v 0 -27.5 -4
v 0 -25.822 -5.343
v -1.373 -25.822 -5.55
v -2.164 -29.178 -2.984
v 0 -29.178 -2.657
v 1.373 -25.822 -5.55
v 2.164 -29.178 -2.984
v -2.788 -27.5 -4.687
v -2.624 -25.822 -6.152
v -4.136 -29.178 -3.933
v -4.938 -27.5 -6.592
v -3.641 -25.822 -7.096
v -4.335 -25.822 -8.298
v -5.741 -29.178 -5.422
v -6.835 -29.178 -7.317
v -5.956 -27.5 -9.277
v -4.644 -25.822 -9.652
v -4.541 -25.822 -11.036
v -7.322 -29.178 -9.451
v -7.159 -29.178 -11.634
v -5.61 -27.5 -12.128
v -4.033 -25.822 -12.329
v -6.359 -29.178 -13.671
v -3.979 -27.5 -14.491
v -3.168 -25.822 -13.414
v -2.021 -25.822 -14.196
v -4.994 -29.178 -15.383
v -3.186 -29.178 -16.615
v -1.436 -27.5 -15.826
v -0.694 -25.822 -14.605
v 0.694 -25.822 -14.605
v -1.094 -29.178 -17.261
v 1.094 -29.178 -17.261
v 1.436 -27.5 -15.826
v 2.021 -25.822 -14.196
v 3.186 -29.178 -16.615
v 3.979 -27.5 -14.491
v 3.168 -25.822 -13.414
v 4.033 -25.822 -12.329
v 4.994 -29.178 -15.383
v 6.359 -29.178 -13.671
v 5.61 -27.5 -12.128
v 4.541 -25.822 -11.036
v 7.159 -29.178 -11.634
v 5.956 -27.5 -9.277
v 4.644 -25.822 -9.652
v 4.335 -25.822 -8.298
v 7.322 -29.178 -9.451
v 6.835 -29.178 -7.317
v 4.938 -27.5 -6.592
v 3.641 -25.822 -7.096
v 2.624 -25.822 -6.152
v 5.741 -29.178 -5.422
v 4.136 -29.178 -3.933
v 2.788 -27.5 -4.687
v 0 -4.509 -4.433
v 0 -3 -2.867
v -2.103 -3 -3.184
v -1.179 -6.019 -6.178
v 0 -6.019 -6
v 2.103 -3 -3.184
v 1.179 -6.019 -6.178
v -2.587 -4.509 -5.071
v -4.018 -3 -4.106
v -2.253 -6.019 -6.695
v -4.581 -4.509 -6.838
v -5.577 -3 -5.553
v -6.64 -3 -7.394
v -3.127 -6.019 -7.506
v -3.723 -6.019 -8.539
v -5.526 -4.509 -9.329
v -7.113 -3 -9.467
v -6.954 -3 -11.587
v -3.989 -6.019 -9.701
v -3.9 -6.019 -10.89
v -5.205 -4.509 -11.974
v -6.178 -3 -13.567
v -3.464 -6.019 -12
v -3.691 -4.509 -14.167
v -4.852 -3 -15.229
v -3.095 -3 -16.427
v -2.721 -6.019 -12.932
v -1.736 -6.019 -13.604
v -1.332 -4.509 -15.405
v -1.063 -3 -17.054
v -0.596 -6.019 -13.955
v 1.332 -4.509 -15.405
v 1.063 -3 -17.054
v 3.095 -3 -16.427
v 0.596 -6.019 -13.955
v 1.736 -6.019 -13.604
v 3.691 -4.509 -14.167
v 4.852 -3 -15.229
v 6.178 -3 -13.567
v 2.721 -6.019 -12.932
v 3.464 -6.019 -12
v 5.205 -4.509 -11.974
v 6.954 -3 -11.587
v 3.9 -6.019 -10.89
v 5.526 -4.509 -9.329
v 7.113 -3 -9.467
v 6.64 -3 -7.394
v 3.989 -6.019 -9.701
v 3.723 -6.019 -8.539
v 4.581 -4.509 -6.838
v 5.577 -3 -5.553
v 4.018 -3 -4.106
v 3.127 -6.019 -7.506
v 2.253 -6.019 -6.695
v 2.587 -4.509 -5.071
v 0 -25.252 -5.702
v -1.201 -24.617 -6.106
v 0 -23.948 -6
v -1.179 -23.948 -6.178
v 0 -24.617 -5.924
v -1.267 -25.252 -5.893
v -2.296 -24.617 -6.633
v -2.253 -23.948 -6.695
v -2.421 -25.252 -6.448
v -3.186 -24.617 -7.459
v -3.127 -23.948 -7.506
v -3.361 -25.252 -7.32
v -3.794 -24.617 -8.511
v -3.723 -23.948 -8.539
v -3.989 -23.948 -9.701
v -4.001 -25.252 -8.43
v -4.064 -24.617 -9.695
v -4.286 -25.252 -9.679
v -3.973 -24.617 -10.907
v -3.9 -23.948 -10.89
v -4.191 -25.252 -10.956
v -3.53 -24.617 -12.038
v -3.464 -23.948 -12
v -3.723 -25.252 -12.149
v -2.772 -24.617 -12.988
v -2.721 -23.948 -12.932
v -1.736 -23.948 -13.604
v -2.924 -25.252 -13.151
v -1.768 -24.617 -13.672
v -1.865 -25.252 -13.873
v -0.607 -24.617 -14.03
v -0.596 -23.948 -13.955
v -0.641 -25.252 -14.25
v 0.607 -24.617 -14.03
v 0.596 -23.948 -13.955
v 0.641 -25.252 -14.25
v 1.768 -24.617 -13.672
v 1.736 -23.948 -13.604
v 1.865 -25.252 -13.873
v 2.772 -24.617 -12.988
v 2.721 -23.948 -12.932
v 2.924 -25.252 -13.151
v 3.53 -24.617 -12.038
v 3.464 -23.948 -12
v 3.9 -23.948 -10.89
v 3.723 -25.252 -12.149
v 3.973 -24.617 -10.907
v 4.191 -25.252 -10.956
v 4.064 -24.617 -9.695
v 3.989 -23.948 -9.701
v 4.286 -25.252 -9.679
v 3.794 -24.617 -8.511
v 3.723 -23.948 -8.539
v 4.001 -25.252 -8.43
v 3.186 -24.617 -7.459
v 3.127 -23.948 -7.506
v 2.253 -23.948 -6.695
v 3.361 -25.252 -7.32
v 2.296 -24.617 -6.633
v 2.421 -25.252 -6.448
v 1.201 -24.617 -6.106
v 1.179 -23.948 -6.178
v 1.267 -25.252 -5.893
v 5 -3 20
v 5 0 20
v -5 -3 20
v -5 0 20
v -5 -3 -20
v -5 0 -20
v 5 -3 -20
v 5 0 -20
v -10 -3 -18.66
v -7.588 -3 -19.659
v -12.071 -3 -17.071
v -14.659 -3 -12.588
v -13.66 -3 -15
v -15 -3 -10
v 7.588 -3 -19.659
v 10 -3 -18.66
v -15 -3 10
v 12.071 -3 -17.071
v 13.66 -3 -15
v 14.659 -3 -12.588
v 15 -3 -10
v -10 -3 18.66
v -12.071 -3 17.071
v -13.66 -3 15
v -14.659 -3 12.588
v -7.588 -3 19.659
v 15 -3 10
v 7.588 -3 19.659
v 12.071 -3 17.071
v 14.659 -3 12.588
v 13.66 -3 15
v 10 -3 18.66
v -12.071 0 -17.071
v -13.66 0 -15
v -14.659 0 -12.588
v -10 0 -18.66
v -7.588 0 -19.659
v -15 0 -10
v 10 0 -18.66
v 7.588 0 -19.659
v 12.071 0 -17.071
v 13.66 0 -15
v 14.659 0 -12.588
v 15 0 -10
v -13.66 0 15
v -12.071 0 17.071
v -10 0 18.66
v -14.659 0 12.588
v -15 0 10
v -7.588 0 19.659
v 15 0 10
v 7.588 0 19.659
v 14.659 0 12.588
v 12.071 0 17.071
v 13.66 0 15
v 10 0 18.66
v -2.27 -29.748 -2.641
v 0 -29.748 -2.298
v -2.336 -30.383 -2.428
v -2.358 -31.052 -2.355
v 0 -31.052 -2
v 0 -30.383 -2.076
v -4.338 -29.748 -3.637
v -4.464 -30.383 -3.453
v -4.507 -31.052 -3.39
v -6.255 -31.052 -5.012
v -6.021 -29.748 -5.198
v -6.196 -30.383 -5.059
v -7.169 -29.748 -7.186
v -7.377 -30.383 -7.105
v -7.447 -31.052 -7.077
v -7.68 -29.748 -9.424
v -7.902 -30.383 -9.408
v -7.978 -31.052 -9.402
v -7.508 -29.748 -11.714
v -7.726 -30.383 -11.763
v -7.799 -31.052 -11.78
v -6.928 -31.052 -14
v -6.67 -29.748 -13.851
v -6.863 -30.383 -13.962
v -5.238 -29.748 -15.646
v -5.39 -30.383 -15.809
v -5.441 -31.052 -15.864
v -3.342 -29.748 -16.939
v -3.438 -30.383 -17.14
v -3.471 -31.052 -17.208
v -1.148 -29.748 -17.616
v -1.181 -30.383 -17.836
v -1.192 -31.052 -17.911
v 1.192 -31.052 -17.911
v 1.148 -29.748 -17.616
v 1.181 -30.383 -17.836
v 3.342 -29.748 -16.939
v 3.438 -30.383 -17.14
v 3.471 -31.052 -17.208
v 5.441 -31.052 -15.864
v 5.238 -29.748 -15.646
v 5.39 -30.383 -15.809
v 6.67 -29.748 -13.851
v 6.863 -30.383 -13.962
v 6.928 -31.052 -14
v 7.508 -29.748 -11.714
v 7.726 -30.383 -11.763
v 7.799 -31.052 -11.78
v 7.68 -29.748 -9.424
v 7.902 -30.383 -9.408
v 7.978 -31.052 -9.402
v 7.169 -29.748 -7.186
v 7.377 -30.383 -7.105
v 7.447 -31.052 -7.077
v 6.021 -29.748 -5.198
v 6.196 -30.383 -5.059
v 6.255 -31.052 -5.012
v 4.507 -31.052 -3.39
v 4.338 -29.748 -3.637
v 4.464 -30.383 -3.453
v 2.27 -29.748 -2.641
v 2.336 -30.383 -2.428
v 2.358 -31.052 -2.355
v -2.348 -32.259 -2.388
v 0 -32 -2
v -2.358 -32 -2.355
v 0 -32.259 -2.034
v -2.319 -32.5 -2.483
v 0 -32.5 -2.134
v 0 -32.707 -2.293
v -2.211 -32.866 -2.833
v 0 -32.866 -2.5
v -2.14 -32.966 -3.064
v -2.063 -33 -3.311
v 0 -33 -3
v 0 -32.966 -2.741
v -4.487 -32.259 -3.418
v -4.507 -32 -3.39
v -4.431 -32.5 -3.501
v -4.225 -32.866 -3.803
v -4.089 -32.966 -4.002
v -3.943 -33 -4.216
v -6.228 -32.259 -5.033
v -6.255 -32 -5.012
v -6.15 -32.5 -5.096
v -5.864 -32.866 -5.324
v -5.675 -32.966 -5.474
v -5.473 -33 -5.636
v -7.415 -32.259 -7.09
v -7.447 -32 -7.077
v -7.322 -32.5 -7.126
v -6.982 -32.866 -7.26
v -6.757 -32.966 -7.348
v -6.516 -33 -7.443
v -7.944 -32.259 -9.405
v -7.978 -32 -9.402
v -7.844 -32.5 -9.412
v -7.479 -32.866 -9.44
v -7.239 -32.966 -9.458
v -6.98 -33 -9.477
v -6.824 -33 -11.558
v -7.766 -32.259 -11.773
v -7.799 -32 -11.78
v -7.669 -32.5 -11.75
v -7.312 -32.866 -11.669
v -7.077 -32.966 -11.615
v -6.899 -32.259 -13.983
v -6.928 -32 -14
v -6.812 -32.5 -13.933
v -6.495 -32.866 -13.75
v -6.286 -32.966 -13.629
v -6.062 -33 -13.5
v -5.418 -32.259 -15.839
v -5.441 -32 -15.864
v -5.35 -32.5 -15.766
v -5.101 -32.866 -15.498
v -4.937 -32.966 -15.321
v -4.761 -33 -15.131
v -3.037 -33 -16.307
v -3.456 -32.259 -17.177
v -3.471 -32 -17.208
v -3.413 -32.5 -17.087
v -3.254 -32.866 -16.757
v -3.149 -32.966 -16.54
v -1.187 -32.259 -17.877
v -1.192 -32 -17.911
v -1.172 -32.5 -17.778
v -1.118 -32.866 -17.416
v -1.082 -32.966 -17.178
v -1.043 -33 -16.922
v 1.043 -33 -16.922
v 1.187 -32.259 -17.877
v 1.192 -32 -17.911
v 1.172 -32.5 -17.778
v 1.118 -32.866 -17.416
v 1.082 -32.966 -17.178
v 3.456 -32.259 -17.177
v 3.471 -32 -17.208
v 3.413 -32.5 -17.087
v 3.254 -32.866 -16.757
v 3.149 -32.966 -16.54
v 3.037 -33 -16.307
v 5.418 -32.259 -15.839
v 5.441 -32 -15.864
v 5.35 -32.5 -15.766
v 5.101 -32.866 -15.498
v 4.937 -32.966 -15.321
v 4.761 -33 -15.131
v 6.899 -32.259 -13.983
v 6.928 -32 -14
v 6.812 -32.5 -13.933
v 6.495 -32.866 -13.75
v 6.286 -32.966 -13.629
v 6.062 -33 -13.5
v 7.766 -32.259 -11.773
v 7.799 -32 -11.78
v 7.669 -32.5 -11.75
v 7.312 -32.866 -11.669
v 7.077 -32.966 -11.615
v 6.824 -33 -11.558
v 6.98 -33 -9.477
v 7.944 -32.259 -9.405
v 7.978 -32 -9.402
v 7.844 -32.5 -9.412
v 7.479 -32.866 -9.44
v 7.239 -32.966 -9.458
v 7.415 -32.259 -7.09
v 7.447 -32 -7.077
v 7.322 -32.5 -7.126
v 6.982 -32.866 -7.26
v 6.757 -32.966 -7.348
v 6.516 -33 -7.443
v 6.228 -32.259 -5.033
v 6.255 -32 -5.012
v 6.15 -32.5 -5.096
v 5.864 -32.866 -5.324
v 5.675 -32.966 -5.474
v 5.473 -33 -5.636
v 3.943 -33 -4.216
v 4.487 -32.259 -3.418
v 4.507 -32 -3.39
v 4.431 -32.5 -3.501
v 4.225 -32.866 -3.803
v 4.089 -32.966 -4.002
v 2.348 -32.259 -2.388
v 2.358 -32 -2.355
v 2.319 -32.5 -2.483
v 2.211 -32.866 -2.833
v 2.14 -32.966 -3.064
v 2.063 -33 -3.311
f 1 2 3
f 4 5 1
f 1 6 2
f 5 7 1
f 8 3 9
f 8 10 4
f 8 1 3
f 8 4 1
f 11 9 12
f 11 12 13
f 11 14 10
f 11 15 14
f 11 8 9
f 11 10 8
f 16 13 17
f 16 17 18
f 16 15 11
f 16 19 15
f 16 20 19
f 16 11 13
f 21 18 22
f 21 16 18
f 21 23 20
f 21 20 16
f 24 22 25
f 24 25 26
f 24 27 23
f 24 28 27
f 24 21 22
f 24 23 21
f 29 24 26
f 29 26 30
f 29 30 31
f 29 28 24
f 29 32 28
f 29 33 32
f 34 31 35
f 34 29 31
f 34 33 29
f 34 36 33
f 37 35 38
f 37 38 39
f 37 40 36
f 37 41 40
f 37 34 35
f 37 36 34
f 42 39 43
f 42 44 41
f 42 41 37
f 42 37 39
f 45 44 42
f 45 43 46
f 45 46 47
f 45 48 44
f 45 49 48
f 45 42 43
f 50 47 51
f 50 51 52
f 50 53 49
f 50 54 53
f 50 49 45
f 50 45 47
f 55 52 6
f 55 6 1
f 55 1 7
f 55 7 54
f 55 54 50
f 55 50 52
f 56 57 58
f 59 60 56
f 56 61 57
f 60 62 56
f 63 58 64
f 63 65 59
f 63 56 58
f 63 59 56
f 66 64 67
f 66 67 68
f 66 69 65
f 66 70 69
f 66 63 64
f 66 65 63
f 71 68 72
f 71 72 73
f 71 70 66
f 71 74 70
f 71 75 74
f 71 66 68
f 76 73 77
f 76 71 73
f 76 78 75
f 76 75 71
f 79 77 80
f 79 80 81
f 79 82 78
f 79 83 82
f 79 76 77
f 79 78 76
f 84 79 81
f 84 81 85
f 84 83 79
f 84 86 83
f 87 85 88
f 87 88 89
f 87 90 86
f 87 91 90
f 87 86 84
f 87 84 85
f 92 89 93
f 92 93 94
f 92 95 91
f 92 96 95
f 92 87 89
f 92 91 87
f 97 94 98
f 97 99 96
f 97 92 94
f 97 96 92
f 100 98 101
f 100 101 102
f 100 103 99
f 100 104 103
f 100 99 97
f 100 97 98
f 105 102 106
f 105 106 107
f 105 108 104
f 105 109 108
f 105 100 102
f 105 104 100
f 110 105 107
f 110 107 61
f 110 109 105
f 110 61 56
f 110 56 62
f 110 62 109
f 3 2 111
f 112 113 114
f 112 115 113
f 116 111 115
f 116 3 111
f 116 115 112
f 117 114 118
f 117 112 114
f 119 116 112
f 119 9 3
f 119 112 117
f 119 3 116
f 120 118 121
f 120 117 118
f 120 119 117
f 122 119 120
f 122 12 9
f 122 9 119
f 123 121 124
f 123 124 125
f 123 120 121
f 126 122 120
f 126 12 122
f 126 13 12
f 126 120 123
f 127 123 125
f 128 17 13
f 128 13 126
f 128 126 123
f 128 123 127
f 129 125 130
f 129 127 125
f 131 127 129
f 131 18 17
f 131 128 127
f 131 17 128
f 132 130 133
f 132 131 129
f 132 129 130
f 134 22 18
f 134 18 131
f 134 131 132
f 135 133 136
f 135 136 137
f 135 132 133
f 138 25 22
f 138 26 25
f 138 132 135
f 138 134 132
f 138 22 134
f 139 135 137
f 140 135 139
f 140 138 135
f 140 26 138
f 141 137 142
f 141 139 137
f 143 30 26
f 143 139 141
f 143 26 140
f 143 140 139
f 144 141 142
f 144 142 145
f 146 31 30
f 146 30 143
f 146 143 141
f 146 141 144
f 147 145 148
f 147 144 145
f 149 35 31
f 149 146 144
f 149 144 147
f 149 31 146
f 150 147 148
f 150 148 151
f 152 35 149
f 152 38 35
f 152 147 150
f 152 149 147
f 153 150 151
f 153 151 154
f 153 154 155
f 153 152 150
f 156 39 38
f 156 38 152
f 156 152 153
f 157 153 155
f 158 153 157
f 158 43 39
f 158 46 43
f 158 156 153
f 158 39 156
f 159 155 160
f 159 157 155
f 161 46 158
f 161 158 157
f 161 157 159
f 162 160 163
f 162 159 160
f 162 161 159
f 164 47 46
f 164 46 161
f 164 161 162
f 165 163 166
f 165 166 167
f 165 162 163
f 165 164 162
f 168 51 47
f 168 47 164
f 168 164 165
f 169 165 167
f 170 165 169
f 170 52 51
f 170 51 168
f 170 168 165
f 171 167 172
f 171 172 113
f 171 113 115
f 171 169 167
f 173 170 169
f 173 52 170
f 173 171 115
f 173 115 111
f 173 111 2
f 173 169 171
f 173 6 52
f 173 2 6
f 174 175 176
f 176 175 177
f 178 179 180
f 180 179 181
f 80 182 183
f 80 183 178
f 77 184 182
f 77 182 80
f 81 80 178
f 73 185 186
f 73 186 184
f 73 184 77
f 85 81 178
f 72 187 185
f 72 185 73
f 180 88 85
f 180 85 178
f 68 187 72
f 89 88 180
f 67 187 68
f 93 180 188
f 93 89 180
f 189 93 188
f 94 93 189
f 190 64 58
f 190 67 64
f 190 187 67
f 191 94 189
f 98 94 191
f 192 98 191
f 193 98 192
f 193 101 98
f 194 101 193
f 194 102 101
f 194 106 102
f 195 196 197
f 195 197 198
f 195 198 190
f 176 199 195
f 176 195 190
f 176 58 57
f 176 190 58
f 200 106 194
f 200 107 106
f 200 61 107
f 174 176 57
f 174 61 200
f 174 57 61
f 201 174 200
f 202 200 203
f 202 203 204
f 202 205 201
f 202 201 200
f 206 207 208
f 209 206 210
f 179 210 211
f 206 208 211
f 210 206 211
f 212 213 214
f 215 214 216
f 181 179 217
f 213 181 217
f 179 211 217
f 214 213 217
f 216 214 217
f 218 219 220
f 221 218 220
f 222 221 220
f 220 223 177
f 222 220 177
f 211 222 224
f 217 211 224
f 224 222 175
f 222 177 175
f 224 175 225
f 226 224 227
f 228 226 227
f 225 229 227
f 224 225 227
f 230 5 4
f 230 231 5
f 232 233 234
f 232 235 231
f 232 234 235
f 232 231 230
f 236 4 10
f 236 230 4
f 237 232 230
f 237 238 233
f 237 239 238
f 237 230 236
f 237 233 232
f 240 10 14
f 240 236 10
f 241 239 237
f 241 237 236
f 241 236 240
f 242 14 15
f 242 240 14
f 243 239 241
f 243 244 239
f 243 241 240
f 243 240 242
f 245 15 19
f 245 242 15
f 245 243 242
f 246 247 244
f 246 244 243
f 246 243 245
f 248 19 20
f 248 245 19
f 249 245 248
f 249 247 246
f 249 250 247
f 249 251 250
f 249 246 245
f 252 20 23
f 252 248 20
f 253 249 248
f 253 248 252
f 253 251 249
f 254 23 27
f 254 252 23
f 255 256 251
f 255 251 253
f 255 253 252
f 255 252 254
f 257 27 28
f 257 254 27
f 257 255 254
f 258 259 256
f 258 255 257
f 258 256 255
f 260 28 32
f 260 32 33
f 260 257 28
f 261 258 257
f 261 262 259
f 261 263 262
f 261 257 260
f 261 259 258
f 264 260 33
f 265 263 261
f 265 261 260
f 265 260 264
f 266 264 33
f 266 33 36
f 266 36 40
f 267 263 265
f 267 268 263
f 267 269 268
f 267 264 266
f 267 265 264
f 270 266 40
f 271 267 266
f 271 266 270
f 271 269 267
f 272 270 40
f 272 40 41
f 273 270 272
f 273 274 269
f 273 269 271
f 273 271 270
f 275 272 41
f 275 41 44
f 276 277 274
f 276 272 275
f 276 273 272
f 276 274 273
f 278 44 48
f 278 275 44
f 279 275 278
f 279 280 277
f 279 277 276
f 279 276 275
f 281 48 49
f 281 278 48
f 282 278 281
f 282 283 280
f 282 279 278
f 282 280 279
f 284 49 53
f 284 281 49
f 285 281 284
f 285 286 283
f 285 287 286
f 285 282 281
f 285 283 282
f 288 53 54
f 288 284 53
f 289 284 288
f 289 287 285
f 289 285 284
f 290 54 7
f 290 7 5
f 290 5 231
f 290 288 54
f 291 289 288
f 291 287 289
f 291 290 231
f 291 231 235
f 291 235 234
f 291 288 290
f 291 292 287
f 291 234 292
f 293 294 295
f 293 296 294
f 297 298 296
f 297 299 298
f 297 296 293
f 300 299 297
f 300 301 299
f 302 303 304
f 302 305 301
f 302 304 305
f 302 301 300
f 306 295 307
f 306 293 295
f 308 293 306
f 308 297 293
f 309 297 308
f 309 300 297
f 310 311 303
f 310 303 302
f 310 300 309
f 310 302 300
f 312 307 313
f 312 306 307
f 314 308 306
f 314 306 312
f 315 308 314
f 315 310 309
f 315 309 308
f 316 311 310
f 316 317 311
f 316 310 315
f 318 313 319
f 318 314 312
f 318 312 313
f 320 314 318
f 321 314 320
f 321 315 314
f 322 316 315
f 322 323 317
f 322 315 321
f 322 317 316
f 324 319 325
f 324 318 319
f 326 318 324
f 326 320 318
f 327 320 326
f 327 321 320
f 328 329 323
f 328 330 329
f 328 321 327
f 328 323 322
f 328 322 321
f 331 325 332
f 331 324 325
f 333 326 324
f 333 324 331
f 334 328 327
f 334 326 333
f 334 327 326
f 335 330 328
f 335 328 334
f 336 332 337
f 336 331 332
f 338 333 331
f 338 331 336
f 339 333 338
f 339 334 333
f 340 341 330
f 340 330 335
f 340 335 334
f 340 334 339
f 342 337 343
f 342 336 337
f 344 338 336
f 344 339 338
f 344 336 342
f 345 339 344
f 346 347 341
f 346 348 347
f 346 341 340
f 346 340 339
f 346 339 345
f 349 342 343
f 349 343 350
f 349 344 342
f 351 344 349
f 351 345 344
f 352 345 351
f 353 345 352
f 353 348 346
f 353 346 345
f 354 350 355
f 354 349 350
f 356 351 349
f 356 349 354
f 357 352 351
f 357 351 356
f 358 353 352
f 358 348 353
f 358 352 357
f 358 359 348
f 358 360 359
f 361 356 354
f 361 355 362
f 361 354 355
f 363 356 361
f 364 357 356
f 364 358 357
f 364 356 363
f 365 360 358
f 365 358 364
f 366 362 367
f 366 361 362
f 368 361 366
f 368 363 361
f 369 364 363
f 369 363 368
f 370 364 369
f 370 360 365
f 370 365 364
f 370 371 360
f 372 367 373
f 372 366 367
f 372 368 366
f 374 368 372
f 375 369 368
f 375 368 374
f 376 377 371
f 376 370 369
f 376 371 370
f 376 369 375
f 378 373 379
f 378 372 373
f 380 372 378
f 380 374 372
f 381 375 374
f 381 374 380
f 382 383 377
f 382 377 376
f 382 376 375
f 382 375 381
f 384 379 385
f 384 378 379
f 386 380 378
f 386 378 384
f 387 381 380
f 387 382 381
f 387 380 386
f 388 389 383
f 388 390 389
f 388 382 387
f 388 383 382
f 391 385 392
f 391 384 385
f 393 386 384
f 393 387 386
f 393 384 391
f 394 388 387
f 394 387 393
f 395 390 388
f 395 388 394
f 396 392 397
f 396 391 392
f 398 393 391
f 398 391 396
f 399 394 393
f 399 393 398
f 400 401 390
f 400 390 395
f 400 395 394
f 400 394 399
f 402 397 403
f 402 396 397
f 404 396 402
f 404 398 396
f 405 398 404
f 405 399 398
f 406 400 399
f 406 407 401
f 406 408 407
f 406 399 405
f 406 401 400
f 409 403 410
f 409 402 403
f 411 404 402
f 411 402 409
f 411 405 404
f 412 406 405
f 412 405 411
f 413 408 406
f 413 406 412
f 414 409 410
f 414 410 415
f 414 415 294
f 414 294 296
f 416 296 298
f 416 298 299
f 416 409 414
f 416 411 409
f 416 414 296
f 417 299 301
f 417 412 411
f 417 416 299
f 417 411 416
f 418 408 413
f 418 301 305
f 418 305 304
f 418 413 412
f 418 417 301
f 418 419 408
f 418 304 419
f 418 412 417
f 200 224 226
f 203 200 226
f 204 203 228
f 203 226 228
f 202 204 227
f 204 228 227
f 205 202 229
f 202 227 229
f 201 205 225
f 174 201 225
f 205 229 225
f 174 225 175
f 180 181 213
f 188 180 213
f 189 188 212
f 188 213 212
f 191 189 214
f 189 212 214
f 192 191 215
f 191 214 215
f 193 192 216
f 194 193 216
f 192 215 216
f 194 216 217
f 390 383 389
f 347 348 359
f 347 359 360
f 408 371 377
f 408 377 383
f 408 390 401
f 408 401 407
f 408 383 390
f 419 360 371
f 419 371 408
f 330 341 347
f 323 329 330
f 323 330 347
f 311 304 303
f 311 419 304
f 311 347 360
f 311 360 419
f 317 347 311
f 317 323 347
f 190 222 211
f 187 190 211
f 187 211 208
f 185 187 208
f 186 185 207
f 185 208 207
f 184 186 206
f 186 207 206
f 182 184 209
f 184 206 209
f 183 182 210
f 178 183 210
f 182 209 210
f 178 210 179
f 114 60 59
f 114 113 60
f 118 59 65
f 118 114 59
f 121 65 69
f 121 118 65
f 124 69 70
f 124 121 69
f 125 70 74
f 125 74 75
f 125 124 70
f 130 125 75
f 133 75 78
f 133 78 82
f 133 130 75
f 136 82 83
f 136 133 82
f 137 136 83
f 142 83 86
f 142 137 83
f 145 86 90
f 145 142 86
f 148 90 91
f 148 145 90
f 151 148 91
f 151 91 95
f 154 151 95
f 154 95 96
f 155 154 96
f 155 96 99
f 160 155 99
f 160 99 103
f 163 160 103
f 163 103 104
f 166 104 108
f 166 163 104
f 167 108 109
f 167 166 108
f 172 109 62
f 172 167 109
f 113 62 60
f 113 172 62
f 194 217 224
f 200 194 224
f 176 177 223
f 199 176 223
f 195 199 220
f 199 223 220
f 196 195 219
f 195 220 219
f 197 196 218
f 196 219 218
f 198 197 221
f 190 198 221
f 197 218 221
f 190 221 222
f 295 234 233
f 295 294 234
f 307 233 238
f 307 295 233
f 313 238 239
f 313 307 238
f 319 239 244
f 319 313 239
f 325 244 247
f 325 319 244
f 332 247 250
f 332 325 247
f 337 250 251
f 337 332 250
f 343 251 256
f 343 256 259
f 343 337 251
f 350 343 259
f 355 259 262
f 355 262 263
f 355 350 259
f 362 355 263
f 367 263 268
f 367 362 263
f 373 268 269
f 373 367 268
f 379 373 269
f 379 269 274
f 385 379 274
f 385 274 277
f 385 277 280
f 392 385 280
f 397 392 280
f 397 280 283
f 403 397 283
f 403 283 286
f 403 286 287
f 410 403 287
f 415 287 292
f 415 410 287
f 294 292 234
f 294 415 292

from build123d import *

# Parameters (mm, degrees)
F1_DEPTH = 3


with BuildPart() as f1:
    # F0 (on Front) → F1 (new body)
    with BuildSketch(Plane.XZ):
        with BuildLine():
            Line((5, 20), (-5, 20))
            ThreePointArc((-5, 20), (-12.0710678119, 17.0710678119), (-15, 10))
            Line((-15, 10), (-15, -10))
            ThreePointArc((-15, -10), (-12.0710678119, -17.0710678119), (-5, -20))
            Line((-5, -20), (5, -20))
            ThreePointArc((5, -20), (12.0710678119, -17.0710678119), (15, -10))
            Line((15, -10), (15, 10))
            ThreePointArc((15, 10), (12.0710678119, 17.0710678119), (5, 20))
        make_face()
    extrude(amount=F1_DEPTH)

    # F4 (on offset) → F5 (revolve)
    with BuildSketch(Plane.YZ):
        with BuildLine():
            Line((-33, -10), (-3, -10))
            Line((-3, -10), (-3, -6))
            Line((-3, -6), (-3, -2.8667848092))
            Line((-3, -2.8667848092), (-6.0189967044, -6))
            Line((-6.0189967044, -6), (-23.9476568219, -6))
            ThreePointArc((-23.9476568219, -6), (-24.9406776462, -5.8308849575), (-25.8217419646, -5.3426064283))
            Line((-25.8217419646, -5.3426064283), (-29.1782580354, -2.6573935717))
            ThreePointArc((-29.1782580354, -2.6573935717), (-30.0593223538, -2.1691150425), (-31.0523431781, -2))
            Line((-31.0523431781, -2), (-32, -2))
            ThreePointArc((-32, -2), (-32.7071067812, -2.2928932188), (-33, -3))
            Line((-33, -3), (-33, -10))
        make_face()
    revolve(axis=Axis((0, -24.5992667091, -10), (0, -1, 0)))


solid = f1.part
